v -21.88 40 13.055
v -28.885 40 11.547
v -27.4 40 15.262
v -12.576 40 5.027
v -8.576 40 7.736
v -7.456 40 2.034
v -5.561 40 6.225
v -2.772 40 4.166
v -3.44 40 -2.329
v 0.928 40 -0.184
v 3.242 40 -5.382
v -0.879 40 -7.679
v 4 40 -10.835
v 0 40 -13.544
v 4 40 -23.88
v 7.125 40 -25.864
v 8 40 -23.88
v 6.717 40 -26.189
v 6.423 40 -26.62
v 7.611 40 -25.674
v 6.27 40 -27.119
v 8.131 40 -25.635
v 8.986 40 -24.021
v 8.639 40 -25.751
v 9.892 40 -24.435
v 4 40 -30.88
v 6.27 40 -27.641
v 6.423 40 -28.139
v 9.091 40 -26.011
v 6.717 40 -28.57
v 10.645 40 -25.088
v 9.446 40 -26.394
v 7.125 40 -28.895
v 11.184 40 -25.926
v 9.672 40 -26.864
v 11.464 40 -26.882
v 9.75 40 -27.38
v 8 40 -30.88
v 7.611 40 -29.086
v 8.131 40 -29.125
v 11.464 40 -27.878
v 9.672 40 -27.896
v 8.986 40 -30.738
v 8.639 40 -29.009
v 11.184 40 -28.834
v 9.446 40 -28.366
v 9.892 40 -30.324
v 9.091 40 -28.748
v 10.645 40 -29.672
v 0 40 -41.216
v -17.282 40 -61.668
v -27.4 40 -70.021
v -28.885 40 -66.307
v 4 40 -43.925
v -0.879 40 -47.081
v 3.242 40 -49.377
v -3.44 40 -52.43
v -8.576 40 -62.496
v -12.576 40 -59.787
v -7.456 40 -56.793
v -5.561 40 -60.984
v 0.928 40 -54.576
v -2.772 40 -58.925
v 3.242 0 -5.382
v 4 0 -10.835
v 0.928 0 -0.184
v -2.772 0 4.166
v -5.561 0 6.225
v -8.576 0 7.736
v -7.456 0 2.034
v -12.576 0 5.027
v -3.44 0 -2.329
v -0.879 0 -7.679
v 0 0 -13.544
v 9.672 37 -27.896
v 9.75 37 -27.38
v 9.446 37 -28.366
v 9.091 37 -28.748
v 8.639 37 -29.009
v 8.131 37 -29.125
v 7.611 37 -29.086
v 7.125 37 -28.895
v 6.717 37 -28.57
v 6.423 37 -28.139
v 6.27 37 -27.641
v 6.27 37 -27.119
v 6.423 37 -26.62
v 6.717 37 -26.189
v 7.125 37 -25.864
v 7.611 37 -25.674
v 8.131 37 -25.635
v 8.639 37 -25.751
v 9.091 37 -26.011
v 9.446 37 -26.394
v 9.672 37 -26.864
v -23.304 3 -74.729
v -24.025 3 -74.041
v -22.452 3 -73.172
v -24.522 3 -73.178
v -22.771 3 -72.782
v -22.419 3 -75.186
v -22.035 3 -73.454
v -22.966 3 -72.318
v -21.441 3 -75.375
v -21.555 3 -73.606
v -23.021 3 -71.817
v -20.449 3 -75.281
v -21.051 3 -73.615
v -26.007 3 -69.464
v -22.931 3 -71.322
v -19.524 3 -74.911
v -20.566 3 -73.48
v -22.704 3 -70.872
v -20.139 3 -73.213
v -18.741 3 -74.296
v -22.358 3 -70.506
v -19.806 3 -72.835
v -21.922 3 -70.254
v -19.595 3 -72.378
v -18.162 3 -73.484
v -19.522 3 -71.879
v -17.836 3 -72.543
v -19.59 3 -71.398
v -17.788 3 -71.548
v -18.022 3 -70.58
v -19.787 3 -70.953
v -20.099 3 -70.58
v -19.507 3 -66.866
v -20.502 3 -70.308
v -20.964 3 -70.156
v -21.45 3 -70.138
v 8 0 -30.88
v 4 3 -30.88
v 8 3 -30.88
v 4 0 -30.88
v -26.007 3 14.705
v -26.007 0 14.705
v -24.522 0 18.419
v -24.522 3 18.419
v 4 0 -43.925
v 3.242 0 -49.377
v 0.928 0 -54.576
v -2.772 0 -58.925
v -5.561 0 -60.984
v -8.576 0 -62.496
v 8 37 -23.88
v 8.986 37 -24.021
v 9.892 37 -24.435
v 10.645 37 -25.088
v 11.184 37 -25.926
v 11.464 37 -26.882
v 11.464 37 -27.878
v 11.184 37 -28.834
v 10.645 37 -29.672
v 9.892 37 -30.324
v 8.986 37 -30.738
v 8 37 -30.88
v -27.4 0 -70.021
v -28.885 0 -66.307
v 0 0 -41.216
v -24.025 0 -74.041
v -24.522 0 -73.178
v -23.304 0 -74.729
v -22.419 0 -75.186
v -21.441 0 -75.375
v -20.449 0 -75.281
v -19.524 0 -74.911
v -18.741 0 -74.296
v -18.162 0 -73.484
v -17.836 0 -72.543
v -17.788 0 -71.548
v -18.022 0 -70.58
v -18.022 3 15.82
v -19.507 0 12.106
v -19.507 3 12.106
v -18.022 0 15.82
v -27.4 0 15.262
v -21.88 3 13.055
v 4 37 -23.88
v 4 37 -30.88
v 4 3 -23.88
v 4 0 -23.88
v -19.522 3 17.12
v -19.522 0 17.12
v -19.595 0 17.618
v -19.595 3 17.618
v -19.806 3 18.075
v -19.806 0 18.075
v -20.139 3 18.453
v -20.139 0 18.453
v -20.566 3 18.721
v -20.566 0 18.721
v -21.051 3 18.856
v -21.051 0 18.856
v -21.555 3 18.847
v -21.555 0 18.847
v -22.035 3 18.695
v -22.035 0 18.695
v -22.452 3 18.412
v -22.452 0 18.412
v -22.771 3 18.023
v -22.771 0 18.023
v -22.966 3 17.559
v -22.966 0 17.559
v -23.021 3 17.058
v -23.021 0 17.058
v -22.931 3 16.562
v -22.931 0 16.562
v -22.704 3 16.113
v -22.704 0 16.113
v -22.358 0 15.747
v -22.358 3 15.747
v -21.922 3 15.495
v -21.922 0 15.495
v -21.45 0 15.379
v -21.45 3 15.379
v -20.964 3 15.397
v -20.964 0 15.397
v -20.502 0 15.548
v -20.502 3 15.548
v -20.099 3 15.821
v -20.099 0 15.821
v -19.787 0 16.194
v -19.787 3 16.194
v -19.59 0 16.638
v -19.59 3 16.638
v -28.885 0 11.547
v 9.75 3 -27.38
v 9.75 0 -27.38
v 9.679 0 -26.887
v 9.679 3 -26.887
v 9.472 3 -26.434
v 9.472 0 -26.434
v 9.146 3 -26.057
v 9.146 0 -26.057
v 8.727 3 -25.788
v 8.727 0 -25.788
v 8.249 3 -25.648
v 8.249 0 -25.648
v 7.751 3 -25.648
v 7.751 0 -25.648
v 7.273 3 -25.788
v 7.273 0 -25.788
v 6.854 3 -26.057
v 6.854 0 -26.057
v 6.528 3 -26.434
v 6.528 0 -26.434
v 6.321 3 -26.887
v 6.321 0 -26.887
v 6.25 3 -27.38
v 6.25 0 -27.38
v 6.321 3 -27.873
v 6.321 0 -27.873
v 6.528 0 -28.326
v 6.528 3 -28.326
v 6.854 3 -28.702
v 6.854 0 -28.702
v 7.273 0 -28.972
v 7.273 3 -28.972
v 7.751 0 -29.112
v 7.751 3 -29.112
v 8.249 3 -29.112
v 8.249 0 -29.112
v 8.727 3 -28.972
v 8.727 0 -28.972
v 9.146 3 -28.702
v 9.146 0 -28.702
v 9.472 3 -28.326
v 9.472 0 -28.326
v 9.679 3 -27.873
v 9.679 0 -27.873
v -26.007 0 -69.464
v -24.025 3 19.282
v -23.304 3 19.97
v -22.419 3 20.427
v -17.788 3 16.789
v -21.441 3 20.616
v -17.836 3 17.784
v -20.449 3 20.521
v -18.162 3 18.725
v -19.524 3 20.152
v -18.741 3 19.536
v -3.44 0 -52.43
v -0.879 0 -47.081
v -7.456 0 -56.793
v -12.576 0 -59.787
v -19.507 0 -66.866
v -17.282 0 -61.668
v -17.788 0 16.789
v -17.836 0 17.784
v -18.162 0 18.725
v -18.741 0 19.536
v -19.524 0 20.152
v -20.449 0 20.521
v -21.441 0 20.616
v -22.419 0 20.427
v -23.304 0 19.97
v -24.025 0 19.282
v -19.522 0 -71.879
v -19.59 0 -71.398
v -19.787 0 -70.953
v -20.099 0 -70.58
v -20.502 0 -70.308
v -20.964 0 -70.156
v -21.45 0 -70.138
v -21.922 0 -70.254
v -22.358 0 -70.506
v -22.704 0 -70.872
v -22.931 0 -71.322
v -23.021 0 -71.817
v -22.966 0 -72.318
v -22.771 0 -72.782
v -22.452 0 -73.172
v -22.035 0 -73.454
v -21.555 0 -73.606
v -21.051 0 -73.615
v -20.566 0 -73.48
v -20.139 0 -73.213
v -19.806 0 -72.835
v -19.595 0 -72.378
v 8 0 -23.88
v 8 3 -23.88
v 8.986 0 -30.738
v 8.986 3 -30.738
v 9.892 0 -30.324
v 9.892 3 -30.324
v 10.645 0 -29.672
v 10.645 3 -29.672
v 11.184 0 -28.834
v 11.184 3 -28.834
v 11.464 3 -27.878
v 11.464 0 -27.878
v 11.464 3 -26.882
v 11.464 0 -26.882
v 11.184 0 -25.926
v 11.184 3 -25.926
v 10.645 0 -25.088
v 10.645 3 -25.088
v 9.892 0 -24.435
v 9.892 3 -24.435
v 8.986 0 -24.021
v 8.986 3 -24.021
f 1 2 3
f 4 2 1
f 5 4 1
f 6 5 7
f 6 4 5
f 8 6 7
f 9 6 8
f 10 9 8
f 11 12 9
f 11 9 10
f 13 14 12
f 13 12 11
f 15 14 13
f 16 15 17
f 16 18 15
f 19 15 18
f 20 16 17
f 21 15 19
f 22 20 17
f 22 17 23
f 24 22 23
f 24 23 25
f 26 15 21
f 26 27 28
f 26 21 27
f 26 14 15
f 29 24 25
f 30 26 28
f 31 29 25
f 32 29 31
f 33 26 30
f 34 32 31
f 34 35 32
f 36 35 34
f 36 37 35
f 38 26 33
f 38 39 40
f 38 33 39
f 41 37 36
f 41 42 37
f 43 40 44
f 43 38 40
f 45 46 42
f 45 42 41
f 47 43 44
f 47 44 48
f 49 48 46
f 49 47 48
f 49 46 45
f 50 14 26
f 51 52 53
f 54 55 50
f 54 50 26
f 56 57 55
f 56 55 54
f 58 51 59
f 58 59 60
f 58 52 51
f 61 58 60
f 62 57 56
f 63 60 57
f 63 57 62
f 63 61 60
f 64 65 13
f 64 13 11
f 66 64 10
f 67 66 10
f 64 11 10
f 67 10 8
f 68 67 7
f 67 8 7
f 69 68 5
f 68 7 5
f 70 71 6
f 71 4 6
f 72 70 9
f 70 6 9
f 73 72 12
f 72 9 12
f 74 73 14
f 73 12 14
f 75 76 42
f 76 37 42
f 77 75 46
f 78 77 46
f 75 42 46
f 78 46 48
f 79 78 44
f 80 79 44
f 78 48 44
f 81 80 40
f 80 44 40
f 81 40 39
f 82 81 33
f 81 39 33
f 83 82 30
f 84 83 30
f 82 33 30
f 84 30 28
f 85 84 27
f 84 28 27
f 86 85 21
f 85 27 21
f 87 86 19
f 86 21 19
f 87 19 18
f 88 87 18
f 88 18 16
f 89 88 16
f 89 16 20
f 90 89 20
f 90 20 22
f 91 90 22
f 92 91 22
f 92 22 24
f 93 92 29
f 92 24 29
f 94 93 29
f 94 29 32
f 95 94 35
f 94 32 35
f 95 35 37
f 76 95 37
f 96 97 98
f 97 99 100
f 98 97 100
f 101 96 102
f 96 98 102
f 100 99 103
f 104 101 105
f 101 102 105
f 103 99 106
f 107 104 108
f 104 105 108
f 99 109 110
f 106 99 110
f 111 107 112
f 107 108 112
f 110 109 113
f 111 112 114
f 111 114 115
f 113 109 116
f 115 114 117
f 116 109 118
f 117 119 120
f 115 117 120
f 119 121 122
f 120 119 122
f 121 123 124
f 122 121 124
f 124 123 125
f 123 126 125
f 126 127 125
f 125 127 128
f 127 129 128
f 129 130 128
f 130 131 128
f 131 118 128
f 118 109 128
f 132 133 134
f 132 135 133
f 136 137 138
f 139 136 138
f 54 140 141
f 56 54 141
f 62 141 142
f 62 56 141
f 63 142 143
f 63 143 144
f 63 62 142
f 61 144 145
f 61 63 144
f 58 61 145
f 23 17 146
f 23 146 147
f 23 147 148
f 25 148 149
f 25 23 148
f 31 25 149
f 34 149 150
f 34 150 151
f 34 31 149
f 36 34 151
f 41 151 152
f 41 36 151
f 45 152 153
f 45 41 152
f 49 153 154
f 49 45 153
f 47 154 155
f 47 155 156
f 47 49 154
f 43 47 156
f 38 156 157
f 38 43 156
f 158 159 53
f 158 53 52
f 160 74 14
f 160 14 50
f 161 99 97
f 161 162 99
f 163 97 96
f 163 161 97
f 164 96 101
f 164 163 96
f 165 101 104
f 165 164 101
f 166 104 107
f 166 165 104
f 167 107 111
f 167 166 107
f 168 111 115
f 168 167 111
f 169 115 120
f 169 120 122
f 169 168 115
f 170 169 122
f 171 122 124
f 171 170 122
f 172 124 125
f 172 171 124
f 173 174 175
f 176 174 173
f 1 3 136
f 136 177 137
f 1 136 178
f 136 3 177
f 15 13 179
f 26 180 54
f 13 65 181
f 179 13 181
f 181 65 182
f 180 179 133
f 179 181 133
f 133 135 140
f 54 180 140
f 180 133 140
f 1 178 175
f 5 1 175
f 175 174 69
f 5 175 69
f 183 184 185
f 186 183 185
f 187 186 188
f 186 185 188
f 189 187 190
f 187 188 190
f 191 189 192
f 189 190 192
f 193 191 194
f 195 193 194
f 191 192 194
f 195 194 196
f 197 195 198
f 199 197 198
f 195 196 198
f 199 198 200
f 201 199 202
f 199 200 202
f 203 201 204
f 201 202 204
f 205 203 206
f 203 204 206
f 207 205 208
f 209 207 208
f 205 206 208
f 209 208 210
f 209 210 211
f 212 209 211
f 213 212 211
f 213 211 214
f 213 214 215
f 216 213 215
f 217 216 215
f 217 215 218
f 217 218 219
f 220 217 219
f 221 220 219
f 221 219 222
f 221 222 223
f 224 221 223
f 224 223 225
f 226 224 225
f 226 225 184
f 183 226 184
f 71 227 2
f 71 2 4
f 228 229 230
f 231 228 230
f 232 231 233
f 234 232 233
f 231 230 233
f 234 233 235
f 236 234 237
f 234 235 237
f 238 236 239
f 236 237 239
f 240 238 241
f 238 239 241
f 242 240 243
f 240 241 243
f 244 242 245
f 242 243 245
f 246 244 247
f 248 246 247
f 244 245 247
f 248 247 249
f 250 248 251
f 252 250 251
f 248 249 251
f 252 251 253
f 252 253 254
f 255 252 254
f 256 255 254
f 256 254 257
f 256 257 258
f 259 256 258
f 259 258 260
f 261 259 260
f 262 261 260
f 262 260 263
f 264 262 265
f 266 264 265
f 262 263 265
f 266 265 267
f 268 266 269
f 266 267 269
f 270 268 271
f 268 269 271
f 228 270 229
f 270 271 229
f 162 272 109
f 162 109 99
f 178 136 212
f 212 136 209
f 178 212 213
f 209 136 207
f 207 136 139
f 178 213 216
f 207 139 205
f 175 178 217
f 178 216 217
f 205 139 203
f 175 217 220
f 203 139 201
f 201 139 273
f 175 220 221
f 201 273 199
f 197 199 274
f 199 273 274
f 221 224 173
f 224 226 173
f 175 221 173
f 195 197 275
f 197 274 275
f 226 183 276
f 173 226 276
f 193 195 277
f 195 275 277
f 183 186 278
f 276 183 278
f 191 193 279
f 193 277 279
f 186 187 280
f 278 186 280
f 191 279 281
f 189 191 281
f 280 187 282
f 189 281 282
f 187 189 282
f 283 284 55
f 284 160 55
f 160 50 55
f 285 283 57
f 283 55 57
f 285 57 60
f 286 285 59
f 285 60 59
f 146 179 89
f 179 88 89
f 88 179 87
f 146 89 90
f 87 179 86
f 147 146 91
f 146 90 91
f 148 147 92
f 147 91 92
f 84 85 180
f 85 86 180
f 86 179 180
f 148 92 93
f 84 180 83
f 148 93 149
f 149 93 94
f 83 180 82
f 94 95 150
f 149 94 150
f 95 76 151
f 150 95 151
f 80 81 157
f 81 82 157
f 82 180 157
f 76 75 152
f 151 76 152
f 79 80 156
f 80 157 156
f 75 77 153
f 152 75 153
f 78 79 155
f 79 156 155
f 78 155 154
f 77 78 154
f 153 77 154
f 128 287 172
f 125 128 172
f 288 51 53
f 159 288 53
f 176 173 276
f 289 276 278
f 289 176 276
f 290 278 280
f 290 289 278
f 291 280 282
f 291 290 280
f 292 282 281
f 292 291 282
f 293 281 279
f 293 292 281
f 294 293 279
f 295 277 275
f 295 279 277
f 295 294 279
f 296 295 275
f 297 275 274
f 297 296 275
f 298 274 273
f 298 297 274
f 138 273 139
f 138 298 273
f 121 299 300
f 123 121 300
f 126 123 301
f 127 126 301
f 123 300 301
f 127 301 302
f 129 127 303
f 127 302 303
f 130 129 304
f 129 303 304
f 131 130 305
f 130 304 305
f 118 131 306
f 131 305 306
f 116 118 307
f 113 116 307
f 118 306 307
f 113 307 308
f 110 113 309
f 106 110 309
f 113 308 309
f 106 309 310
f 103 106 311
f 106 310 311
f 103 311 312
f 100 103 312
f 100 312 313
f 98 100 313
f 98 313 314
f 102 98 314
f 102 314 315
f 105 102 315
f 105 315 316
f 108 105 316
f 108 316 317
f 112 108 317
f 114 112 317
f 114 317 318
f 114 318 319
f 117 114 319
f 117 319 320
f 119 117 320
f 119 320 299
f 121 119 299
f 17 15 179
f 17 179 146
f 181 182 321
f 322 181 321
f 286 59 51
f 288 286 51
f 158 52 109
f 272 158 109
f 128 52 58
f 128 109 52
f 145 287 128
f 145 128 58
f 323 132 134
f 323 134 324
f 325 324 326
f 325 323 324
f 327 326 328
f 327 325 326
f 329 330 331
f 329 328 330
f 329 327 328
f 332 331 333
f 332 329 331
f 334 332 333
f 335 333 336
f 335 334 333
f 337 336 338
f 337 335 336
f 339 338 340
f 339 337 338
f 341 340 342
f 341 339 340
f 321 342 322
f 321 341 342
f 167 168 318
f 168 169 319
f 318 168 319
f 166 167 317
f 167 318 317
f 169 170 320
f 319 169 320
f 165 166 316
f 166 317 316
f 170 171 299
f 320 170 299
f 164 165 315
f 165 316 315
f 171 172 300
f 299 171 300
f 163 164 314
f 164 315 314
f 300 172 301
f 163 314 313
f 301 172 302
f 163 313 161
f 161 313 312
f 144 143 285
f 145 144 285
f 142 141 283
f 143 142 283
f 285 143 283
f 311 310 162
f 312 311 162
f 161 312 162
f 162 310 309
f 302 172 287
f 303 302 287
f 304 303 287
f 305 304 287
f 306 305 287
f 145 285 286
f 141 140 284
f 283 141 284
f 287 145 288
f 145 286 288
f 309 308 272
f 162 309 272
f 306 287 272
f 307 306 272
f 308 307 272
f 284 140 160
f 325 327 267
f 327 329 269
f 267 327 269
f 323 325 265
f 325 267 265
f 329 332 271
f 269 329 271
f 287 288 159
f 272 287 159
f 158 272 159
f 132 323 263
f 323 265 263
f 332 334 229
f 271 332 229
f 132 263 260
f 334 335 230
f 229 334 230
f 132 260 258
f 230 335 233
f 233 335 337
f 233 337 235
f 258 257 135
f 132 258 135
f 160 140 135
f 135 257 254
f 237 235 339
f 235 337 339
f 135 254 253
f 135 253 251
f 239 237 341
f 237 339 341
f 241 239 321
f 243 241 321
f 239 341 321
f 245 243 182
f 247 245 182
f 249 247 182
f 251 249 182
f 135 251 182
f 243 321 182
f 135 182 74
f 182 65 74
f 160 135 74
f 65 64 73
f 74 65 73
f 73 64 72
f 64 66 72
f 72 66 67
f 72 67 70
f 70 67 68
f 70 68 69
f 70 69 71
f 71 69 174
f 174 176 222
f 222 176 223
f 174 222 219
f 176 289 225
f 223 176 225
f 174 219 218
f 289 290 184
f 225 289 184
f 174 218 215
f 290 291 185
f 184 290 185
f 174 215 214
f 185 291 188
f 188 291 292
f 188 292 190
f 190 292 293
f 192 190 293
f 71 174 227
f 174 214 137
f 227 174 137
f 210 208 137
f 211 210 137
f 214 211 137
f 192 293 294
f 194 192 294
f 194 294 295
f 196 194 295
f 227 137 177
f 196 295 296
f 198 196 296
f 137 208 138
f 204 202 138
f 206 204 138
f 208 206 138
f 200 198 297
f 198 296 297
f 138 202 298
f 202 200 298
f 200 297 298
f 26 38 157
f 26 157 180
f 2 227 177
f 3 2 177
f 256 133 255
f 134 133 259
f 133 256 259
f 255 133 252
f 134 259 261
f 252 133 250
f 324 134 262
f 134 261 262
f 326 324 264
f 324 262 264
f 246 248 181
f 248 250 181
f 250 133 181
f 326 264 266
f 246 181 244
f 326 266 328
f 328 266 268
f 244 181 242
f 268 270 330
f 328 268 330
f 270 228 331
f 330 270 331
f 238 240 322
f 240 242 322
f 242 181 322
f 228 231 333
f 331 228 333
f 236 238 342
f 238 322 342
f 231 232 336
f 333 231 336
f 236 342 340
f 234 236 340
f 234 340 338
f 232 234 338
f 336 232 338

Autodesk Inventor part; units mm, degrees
ref_plane "YZ Plane" through (0, 0, 0) normal (1, 0, 0) x (0, 1, 0)
ref_plane "XZ Plane" through (0, 0, 0) normal (0, 1, 0) x (-1, 0, 0)
ref_plane "XY Plane" through (0, 0, 0) normal (0, 0, 1) x (1, 0, 0)
sketch "Sketch1" plane through (0, 0, 0) normal (0, 1, 0) x (-1, 0, 0)
  line L0 (0, 0) -> (0, -54.7595)
  line L1 (0, -54.7595) -> (17.2816, -61.6681)
  line L2 (0, -54.7595) -> (18.6114, -54.7595) construction
  line L3 (0, -54.7595) -> (28.8848, -66.3067)
  line L4 (28.8848, -66.3067) -> (28.8848, -54.7595)
  line L5 (28.8848, -54.7595) -> (28.8848, 0)
  line L6 (28.8848, 0) -> (28.8848, 11.5473)
  line L7 (28.8848, 11.5473) -> (0, 0)
  line L8 (0, -50.5358) -> (-4, -50.5358)
  line L9 (3.9418, -56.3353) -> (2.457, -60.0495)
  line L10 (2.457, -60.0495) -> (-4, -57.4682)
  line L11 (-4, -57.4682) -> (-4, -50.5358)
  line L12 (28.8848, -66.3067) -> (27.4, -70.0209)
  line L13 (27.4, -70.0209) -> (2.457, -60.0495)
  line L14 (0, -3.5872) -> (-4, -3.5872)
  line L15 (-4, -3.5872) -> (-4, -50.5358)
  line L16 (2.457, 0.9822) -> (0.9721, 4.6964)
  line L17 (0.9721, 4.6964) -> (-4, 2.7087)
  line L18 (-4, 2.7087) -> (-4, -3.5872)
  line L19 (23.3647, 9.3405) -> (21.8799, 13.0547)
  line L20 (21.8799, 13.0547) -> (0.9721, 4.6964)
  line L21 (28.8848, 11.5473) -> (27.4, 15.2615)
  line L22 (27.4, 15.2615) -> (21.8799, 13.0547)
  dimension "d0" = 54.7595
  dimension "d1" = 21.79
  dimension "d2" = 31.1075
  dimension "d3" = 11.5473
  dimension "d4" = 11.5473
  dimension "d5" = 4
  dimension "d6" = 4
  dimension "d7" = 4
extrude "Extrusion1" add sketch "Sketch1" along normal blind 40 contours L0 L14 L18 L17 L16 L7 | L0 L8 L15 L14 | L16 L20 L19 L7 | L0 L1 L9 L10 L11 L8 | L19 L22 L21 L7 | L1 L3 L12 L13 L9
sketch "Sketch2" plane through (0, 0, 0) normal (0, -1, 0) x (1, 0, 0)
  line L0 (0, -54.7595) -> (0, 0) projected
  line L1 (0, -27.3797) -> (8, -27.3797)
  circle A0 centre (8, -27.3797) radius 1.75
  circle A1 centre (8, -27.3797) radius 3.5
  line L2 (4, 2.7087) -> (4, -57.4682) projected
  line L3 (4, -27.3797) -> (4, -30.8797)
  line L4 (4, -30.8797) -> (8, -30.8797)
  line L5 (4, -27.3797) -> (4, -23.8797)
  line L6 (4, -23.8797) -> (8, -23.8797)
  line L7 (-27.4, -70.0209) -> (-28.8848, -66.3067) projected
  line L8 (-28.8848, -66.3067) -> (-27.0288, -70.9495)
  line L9 (-27.0288, -70.9495) -> (-28.8848, -66.3067)
  line L10 (-28.8848, -66.3067) -> (-24.2421, -64.4507)
  line L11 (-24.2421, -64.4507) -> (-21.2724, -71.8791)
  circle A2 centre (-21.2724, -71.8791) radius 1.75
  circle A3 centre (-21.2724, -71.8791) radius 3.5
  line L12 (4, -57.4682) -> (-27.4, -70.0209) projected
  line L13 (-22.7573, -68.1649) -> (-26.0072, -69.4641)
  line L14 (-26.0072, -69.4641) -> (-24.5224, -73.1783)
  line L15 (-22.7573, -68.1649) -> (-19.5073, -66.8657)
  line L16 (-19.5073, -66.8657) -> (-18.0225, -70.5799)
  line L17 (-28.8848, 11.5473) -> (-24.2421, 9.6912)
  line L18 (0, 0) -> (-28.8848, 11.5473) projected
  line L19 (-24.2421, 9.6912) -> (-21.2724, 17.1196)
  circle A4 centre (-21.2724, 17.1196) radius 1.75
  circle A5 centre (-21.2724, 17.1196) radius 3.5
  line L20 (-27.4, 15.2615) -> (4, 2.7087) projected
  line L21 (-22.7573, 13.4054) -> (-26.0072, 14.7047)
  line L22 (-26.0072, 14.7047) -> (-24.5224, 18.4189)
  line L23 (-22.7573, 13.4054) -> (-19.5073, 12.1062)
  line L24 (-19.5073, 12.1062) -> (-18.0225, 15.8204)
  dimension "d10" = 8
  dimension "d11" = 3.5
  dimension "d12" = 7
  dimension "d13" = 5
  dimension "d14" = 5
  dimension "d15" = 8
  dimension "d16" = 3.5
  dimension "d17" = 7
  dimension "d18" = 3.5
  dimension "d19" = 3.5
  dimension "d20" = 5
  dimension "d21" = 3.5
  dimension "d22" = 7
  dimension "d23" = 3.5
extrude "Extrusion2" add sketch "Sketch2" against normal blind 3 contours L16 A3 L11 L12 | L2 L6 A1 L1 | L1 A1 L4 L2 | A1 | L20 L22 A5 L19 | L19 A5 L24 L20 | A5 | L11 A3 L14 L12 | A3
sketch "Sketch3" plane through (0, 40, 0) normal (0, 1, 0) x (1, 0, 0)
  line L0 (4, 23.8797) -> (4, 30.8797) projected
  line L1 (4, 27.3797) -> (4, 30.8797)
  line L2 (8, 30.8797) -> (4, 30.8797) projected
  line L3 (4, 30.8797) -> (8, 30.8797)
  line L4 (4, 27.3797) -> (4, 23.8797)
  line L5 (4, 23.8797) -> (8, 23.8797) projected
  line L6 (4, 23.8797) -> (8, 23.8797)
  circle A0 centre (8, 27.3797) radius 1.75 projected
  circle A1 centre (8, 27.3797) radius 1.75
  circle A2 centre (8, 27.3797) radius 3.5
  point P0 (0, 0)
extrude "Extrusion3" add sketch "Sketch3" against normal blind 3 contours A2
sketch "Sketch4" plane through (0, 40, 0) normal (0, 1, 0) x (1, 0, 0)
  line L0 (4, 23.8797) -> (4, 30.8797) projected
  line L1 (4, 23.8797) -> (8, 23.8797)
  circle A0 centre (8, 27.3797) radius 3.5 projected
  line L2 (8, 30.8797) -> (4, 30.8797) projected
  line L3 (4, 30.8797) -> (8, 30.8797)
  point P0 (0, 0)
extrude "Extrusion4" add sketch "Sketch4" against normal blind 3 contours L0 L2 A0 L1
sketch "Sketch5" plane through (0, 40, 0) normal (0, 1, 0) x (1, 0, 0)
  point P0 (0, 0)
fillet "Fillet1" radius 20 4 edges at (0, 20, 0) (0, 20, -54.7595) (4, 20, 2.7087) (4, 20, -57.4682)
properties part number "Capture Zone4"
